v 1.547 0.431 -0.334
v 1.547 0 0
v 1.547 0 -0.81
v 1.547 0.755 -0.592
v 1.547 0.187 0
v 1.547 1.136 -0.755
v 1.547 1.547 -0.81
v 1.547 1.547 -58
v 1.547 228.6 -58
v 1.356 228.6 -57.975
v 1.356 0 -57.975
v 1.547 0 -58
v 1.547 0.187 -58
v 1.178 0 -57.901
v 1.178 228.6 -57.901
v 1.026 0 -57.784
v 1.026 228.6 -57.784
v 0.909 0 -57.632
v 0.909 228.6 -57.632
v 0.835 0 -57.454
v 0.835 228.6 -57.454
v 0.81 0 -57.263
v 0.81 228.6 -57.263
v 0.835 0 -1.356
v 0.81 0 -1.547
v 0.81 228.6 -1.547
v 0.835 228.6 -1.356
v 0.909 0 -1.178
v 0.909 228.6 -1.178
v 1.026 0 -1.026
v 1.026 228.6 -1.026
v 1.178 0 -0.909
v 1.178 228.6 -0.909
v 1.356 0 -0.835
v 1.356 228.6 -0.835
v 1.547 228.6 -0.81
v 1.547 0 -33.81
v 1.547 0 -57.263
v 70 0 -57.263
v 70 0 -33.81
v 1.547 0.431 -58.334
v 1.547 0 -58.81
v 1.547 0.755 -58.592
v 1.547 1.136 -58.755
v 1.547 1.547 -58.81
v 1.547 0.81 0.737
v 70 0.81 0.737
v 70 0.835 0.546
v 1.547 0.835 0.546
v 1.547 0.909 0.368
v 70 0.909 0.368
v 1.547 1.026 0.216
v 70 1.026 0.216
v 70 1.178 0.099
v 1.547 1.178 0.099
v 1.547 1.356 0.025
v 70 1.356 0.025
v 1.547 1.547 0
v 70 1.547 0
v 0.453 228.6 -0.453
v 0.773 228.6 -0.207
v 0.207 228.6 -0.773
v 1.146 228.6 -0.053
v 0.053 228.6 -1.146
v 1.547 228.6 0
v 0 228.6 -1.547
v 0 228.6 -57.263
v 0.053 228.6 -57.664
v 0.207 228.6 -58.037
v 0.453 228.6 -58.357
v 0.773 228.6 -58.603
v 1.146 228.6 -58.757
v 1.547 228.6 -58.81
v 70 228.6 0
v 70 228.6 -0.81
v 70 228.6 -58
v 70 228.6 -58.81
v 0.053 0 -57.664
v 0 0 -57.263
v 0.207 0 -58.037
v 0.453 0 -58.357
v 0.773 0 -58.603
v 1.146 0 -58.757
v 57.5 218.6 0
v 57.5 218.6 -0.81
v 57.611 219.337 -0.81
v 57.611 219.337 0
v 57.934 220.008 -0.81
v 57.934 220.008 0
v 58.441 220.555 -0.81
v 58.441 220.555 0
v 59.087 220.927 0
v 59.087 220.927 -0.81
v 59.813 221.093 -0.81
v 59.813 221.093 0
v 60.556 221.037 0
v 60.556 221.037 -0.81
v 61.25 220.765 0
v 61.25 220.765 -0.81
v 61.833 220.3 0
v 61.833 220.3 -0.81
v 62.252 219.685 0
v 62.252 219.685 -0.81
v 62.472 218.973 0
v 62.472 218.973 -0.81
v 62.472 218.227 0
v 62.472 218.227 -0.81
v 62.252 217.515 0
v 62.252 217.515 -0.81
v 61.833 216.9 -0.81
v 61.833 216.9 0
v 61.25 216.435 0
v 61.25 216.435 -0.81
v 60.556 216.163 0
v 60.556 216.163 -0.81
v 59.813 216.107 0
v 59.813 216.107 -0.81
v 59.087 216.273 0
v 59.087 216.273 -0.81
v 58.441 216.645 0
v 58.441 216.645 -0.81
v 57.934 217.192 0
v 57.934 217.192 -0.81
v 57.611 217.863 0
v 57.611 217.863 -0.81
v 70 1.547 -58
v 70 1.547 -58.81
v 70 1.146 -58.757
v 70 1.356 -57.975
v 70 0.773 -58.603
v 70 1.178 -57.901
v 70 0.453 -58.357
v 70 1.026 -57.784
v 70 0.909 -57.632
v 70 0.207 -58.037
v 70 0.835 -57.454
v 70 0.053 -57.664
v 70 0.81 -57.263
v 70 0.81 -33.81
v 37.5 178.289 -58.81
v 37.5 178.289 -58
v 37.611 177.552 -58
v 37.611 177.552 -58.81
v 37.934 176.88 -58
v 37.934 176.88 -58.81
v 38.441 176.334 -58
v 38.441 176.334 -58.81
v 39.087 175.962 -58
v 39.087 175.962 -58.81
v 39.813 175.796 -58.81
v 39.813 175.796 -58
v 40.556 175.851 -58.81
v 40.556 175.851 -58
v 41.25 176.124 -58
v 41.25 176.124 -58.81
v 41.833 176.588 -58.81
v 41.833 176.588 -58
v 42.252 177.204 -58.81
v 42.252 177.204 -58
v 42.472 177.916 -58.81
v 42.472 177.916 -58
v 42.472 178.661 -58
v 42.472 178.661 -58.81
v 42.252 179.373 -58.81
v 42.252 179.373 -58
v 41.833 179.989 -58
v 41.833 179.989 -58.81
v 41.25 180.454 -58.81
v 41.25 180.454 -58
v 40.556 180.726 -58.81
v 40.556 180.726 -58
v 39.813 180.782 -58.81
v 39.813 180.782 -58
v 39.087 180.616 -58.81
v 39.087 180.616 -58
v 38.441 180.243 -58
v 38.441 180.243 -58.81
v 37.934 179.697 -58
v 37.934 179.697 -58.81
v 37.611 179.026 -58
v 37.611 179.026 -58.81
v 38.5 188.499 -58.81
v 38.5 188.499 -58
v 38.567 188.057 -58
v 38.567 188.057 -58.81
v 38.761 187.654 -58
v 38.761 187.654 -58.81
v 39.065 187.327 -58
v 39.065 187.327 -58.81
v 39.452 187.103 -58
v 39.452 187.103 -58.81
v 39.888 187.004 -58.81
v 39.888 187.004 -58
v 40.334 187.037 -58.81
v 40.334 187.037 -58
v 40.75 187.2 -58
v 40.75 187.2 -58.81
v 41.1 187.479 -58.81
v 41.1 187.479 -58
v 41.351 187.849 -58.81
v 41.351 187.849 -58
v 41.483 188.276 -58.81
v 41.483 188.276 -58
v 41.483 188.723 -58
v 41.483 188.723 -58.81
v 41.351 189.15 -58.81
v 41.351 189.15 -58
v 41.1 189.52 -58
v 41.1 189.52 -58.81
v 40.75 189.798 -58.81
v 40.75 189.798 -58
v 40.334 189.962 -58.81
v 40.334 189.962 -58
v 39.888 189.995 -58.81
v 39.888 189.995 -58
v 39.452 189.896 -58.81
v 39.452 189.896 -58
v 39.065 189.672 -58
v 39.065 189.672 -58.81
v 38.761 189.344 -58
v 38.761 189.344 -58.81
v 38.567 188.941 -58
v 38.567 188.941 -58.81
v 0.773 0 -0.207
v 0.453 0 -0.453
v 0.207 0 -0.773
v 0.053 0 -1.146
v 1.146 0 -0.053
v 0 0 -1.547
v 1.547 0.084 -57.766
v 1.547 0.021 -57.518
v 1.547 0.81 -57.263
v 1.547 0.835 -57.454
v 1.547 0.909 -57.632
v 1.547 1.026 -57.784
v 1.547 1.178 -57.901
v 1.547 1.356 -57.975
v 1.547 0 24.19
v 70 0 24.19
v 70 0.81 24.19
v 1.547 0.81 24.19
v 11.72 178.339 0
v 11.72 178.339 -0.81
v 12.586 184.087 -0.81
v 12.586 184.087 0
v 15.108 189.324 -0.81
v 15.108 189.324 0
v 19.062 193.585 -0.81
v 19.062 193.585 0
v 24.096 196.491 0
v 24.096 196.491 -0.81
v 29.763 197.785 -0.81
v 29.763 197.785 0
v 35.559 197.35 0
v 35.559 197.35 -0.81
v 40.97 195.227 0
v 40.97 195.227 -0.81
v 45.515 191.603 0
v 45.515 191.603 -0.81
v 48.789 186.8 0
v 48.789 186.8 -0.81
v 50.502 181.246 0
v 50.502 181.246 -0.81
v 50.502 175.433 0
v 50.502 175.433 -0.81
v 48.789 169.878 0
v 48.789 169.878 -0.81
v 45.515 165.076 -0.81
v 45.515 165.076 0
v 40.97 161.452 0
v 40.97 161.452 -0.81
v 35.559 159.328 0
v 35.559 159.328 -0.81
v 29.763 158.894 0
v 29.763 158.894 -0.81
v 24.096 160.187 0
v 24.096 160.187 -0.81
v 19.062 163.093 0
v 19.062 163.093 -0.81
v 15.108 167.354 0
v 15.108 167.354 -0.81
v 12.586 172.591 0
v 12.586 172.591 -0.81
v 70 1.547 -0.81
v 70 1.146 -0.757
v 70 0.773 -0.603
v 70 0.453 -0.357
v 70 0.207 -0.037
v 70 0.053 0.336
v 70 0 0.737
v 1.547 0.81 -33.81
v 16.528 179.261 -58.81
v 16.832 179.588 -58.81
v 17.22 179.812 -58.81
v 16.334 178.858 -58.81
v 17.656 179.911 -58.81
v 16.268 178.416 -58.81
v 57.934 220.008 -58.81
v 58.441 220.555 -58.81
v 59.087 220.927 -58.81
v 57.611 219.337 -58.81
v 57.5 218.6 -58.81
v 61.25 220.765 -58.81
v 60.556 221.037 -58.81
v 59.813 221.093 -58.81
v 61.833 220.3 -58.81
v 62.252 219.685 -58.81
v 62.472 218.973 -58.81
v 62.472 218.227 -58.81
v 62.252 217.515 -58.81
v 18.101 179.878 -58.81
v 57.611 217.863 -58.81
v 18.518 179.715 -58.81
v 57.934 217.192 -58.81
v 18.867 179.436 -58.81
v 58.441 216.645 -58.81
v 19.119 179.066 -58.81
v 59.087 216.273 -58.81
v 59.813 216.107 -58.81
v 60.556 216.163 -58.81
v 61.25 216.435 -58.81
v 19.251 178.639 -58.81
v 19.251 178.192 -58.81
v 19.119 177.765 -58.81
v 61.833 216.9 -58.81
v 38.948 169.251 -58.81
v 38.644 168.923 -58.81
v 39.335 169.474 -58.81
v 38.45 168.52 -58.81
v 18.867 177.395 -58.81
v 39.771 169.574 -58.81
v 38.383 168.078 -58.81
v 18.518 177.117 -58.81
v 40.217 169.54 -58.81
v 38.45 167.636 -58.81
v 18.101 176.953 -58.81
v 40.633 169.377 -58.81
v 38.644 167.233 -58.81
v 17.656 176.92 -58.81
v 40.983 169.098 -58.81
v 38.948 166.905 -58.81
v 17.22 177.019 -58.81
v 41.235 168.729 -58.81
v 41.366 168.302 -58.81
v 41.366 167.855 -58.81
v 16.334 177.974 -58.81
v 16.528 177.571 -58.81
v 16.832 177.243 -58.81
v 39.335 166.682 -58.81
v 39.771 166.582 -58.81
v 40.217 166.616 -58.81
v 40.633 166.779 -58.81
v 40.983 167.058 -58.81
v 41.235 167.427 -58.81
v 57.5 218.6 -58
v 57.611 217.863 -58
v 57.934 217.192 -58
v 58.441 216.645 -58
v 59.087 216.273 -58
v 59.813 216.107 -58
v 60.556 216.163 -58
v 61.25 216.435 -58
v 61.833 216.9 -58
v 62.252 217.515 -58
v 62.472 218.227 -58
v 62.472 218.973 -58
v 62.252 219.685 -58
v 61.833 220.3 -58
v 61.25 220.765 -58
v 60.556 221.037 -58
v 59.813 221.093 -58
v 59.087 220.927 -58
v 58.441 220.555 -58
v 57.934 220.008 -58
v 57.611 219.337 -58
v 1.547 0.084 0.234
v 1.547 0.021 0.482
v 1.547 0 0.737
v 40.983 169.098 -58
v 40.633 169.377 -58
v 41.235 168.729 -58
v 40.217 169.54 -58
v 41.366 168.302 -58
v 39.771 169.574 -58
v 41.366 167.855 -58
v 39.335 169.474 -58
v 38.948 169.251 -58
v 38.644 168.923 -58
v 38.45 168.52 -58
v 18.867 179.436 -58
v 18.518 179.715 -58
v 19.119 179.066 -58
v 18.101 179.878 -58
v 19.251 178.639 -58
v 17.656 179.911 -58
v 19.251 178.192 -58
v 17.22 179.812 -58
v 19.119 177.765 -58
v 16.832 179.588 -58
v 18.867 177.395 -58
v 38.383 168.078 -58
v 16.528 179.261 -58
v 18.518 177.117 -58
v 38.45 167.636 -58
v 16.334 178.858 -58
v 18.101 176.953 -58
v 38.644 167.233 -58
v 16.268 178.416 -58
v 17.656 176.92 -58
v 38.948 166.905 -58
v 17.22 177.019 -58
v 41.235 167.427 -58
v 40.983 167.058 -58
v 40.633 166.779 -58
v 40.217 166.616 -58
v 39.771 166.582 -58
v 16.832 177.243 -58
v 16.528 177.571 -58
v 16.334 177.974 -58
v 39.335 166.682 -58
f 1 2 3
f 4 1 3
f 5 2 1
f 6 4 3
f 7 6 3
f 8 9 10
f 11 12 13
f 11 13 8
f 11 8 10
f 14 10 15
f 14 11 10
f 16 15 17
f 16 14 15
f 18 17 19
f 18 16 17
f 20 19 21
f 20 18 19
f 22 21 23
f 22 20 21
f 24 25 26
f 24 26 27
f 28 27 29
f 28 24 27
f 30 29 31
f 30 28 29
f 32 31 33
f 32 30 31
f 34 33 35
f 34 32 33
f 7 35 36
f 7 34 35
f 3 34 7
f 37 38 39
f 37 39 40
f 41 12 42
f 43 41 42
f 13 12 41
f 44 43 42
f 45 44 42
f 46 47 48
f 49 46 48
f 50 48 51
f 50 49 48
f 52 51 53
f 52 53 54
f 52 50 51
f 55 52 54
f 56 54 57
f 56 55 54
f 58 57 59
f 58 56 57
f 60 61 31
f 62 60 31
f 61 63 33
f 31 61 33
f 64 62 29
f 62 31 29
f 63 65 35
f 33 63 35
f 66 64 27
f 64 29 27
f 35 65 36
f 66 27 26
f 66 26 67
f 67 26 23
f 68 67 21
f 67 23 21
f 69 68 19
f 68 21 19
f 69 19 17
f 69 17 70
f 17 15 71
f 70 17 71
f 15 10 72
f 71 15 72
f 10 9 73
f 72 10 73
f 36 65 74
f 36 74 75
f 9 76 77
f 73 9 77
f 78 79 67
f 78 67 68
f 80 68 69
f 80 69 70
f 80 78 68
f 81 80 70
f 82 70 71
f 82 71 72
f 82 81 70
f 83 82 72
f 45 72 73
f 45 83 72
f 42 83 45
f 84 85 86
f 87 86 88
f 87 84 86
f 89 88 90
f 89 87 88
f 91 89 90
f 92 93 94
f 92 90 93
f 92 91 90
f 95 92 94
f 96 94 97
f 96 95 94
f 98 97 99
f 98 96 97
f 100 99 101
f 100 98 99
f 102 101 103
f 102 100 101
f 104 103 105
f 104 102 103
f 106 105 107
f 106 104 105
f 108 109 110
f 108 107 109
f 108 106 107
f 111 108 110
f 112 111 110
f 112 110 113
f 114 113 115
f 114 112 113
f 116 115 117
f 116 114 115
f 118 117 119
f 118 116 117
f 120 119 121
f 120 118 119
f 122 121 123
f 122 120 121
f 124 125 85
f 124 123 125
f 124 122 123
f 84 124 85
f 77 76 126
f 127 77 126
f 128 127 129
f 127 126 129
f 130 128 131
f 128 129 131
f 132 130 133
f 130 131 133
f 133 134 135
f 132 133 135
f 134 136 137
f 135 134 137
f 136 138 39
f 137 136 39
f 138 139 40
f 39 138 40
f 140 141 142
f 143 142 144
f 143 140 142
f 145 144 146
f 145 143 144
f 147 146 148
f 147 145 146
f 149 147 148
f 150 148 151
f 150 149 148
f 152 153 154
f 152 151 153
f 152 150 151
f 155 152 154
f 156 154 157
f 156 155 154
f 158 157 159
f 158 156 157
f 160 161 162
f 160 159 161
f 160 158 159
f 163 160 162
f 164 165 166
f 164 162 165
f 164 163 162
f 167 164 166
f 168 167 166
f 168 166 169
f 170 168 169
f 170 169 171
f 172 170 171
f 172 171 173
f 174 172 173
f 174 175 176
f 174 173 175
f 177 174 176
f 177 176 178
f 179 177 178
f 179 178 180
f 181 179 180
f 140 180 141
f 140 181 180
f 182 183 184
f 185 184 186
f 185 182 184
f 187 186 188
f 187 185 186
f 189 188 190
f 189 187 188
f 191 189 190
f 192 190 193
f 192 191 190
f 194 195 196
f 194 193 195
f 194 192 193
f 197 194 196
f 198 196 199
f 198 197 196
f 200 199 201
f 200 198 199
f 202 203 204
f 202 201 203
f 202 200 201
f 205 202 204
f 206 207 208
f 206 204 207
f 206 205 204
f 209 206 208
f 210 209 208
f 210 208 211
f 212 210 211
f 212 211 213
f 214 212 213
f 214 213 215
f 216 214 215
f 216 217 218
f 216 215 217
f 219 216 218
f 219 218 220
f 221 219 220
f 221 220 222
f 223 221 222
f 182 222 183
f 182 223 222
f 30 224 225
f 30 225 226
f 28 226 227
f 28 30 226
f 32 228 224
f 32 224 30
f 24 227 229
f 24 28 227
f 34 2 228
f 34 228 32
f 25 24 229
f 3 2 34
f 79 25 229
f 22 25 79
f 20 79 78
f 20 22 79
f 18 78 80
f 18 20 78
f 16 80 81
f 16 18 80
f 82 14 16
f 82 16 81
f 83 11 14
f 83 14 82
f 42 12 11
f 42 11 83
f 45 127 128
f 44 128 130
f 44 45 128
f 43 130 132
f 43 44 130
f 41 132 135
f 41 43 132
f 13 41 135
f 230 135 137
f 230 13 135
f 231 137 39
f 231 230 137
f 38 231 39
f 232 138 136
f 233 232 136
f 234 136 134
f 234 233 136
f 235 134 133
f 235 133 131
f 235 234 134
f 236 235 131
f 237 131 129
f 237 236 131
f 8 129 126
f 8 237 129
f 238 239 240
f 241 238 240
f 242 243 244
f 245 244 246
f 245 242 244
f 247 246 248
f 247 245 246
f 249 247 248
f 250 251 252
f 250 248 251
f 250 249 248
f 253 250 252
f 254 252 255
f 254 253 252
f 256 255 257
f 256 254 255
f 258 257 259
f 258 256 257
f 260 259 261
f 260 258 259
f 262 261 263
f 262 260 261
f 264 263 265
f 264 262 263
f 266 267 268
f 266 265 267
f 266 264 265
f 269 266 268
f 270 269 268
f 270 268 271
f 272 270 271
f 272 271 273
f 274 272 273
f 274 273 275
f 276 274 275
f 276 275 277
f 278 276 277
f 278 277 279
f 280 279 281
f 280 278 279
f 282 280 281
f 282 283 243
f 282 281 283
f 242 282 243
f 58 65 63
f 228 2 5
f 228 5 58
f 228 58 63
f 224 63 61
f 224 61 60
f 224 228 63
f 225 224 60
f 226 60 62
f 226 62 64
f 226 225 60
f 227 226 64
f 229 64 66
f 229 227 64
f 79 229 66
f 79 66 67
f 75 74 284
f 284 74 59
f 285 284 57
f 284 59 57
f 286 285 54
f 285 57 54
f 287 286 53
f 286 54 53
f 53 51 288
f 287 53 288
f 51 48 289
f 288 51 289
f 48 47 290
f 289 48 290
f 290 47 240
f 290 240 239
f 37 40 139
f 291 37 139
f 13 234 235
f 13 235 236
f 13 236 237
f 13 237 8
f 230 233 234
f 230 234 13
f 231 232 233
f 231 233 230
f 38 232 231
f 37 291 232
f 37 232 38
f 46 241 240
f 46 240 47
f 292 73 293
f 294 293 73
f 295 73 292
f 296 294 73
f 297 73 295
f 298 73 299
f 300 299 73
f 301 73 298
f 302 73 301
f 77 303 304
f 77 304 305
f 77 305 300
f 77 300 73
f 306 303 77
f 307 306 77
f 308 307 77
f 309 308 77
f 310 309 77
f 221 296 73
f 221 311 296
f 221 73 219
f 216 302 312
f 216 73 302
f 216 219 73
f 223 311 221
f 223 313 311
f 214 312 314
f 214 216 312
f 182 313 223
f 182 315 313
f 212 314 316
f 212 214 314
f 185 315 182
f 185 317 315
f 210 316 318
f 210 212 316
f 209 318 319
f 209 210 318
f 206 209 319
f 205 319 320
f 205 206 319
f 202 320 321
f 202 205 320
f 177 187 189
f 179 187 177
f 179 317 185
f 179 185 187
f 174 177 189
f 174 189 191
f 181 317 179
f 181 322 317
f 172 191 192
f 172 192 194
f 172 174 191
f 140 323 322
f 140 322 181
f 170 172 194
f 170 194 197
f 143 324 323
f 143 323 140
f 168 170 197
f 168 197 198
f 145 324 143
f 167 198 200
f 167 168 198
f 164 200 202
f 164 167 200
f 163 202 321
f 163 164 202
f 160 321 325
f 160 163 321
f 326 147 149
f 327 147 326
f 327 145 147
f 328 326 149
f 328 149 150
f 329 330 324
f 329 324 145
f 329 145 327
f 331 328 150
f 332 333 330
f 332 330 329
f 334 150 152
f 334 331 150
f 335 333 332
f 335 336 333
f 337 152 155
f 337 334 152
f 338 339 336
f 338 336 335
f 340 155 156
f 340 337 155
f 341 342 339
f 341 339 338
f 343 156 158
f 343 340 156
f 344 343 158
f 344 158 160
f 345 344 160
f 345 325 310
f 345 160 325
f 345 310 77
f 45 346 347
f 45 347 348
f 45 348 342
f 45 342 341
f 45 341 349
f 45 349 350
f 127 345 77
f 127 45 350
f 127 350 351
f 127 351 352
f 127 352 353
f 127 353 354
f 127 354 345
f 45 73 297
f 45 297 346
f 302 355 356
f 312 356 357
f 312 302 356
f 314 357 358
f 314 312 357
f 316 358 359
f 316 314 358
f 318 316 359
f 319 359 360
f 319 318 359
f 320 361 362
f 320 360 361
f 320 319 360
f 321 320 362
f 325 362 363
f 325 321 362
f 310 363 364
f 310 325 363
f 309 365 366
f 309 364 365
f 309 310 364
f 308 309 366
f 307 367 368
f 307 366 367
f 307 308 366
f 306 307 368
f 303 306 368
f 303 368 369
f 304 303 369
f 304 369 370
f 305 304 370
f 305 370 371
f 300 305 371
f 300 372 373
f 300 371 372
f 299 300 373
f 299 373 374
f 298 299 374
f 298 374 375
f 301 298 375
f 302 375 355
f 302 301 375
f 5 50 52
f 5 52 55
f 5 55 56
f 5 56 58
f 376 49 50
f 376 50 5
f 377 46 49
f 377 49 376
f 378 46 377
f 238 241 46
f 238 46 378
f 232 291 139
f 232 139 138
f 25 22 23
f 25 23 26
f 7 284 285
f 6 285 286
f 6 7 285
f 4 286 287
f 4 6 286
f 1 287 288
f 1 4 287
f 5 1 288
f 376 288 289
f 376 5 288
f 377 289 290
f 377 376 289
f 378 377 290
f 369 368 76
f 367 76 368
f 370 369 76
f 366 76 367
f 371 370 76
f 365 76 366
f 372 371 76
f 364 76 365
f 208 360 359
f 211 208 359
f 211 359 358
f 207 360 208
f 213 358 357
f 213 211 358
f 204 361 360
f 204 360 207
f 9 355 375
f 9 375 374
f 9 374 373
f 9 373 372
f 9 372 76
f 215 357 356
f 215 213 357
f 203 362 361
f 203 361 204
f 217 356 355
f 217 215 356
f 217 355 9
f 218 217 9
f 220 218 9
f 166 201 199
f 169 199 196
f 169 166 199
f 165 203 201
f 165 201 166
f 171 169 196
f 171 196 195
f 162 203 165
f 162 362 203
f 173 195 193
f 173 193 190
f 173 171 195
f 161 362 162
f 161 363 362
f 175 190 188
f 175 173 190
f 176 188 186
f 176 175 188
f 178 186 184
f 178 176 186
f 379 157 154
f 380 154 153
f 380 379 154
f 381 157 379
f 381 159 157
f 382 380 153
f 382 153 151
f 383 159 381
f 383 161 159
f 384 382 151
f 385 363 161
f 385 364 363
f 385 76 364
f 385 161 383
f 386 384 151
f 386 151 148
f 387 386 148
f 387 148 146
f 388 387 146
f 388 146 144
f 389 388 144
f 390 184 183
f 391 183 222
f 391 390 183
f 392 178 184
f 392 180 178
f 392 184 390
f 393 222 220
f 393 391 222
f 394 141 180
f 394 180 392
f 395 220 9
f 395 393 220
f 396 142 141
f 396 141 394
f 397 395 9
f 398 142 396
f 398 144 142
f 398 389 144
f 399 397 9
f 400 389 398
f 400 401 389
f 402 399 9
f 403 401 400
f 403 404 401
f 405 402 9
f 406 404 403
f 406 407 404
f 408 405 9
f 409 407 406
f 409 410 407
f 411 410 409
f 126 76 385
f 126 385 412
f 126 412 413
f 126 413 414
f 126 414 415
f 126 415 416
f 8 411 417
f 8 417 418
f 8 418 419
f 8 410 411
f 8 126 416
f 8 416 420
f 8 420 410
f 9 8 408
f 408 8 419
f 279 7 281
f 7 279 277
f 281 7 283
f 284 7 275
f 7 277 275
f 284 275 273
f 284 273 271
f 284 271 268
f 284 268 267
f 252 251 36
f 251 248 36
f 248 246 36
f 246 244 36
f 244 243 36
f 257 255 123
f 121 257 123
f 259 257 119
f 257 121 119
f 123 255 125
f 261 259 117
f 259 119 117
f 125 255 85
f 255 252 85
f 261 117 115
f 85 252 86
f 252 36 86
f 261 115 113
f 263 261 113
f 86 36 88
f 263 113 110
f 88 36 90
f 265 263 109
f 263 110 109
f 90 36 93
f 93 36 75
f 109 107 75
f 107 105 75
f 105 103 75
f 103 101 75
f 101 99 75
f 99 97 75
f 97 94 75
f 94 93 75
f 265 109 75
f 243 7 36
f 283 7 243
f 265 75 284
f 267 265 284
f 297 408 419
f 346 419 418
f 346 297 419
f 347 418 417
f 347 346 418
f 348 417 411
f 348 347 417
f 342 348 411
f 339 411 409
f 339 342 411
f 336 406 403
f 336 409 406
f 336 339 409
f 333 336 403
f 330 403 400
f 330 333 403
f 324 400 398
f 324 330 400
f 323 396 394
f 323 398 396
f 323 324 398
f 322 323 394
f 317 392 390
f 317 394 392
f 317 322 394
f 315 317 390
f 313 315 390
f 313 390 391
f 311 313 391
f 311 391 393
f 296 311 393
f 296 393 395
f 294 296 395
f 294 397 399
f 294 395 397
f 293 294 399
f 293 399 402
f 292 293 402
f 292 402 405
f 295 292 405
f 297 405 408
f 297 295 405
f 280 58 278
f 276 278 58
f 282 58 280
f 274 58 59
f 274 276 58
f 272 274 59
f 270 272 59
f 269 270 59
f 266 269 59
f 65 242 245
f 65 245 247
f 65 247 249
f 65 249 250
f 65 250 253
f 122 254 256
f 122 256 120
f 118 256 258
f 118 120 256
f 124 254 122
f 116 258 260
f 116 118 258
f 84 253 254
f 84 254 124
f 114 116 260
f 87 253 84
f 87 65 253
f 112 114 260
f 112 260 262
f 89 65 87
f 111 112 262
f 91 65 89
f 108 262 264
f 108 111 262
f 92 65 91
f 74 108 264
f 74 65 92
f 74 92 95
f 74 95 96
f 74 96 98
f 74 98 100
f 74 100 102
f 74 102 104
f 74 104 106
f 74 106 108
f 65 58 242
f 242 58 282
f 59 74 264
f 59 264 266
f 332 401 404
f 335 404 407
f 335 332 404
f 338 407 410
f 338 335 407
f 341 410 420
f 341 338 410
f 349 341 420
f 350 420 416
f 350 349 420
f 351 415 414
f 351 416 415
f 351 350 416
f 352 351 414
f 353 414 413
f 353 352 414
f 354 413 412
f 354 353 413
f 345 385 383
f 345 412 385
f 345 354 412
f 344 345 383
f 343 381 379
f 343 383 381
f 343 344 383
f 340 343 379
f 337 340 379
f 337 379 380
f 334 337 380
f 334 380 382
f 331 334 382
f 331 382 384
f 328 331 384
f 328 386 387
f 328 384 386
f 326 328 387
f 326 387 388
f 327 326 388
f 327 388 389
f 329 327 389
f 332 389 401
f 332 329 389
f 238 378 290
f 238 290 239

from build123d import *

# Parameters (mm, degrees)
SKETCH1_W                      = 70
SKETCH1_H                      = 228.6
BASE_FLANGE1_DEPTH             = 0.81
EDGE_FLANGE1_STRIP_W           = 4.7132
EDGE_FLANGE1_STRIP_H           = 0.81
EDGE_FLANGE1_STRIP_CUT_DEPTH   = 228.6
EDGE_FLANGE1_DEPTH             = 228.6
EDGE_FLANGE2_STRIP_W           = 4.7132
EDGE_FLANGE2_STRIP_H           = 0.81
EDGE_FLANGE2_STRIP_CUT_DEPTH   = 228.6
EDGE_FLANGE2_DEPTH             = 228.6
EDGE_FLANGE3_STRIP_W           = 4.7132
EDGE_FLANGE3_STRIP_H           = 0.81
EDGE_FLANGE3_STRIP_CUT_DEPTH   = 68.4534
EDGE_FLANGE3_STRIP_2_W         = 4.7132
EDGE_FLANGE3_STRIP_2_H         = 0.81
EDGE_FLANGE3_STRIP_CUT_2_DEPTH = 68.4534
EDGE_FLANGE3_DEPTH             = 68.4534
EDGE_FLANGE3_BEND_DEPTH        = 68.4534
CUT_EXTRUDE2_REACH             = 255.075
SKETCH18_R                     = 2.5
SKETCH18_R_2                   = 1.5
CUT_EXTRUDE1_REACH             = 248.204
SKETCH17_R                     = 19.5
SKETCH17_R_2                   = 2.5


# Sheet-metal steps are written as plain solids
with BuildPart() as part:
    # Sketch1 → Base-Flange1 (new body)
    with BuildSketch(Plane.XY):
        with Locations((35, 114.3)):
            Rectangle(SKETCH1_W, SKETCH1_H)
    extrude(amount=-BASE_FLANGE1_DEPTH)

    # Edge-Flange1 strip (across the edge) → Edge-Flange1 strip cut (cut)
    with BuildSketch(Plane(origin=(0, 0, -0.81), x_dir=(1, 0, 0), z_dir=(0, 1, 0))):
        with Locations((-0.81, -0.405)):
            Rectangle(EDGE_FLANGE1_STRIP_W, EDGE_FLANGE1_STRIP_H)
    extrude(amount=EDGE_FLANGE1_STRIP_CUT_DEPTH, mode=Mode.SUBTRACT)

    # Edge-Flange1 section (across the edge) → Edge-Flange1 (add)
    with BuildSketch(Plane(origin=(0, 0, -0.81), x_dir=(1, 0, 0), z_dir=(0, 1, 0))):
        with BuildLine():
            Line((0, 0.7366), (0, 58))
            Line((0, 58), (0.81, 58))
            Line((0.81, 58), (0.81, 0.7366))
            ThreePointArc((0.81, 0.7366), (1.025745145, 0.215745145), (1.5466, 0))
            Line((1.5466, 0), (1.5466, -0.81))
            ThreePointArc((1.5466, -0.81), (0.452988652, -0.357011348), (0, 0.7366))
        make_face()
    extrude(amount=EDGE_FLANGE1_DEPTH)

    # Edge-Flange2 strip (across the edge) → Edge-Flange2 strip cut (cut)
    with BuildSketch(Plane(origin=(0.81, 0, -58.81), x_dir=(0, 0, 1), z_dir=(0, 1, 0))):
        with Locations((-0.81, -0.405)):
            Rectangle(EDGE_FLANGE2_STRIP_W, EDGE_FLANGE2_STRIP_H)
    extrude(amount=EDGE_FLANGE2_STRIP_CUT_DEPTH, mode=Mode.SUBTRACT)

    # Edge-Flange2 section (across the edge) → Edge-Flange2 (add)
    with BuildSketch(Plane(origin=(0.81, 0, -58.81), x_dir=(0, 0, 1), z_dir=(0, 1, 0))):
        with BuildLine():
            Line((0, 0.7366), (0, 69.19))
            Line((0, 69.19), (0.81, 69.19))
            Line((0.81, 69.19), (0.81, 0.7366))
            ThreePointArc((0.81, 0.7366), (1.025745145, 0.215745145), (1.5466, 0))
            Line((1.5466, 0), (1.5466, -0.81))
            ThreePointArc((1.5466, -0.81), (0.452988652, -0.357011348), (0, 0.7366))
        make_face()
    extrude(amount=EDGE_FLANGE2_DEPTH)

    # Edge-Flange3 strip (across the edge) → Edge-Flange3 strip cut (cut)
    with BuildSketch(Plane.YZ.offset(1.5466)):
        with Locations((-0.81, -0.405)):
            Rectangle(EDGE_FLANGE3_STRIP_W, EDGE_FLANGE3_STRIP_H)
    extrude(amount=EDGE_FLANGE3_STRIP_CUT_DEPTH, mode=Mode.SUBTRACT)

    # Edge-Flange3 strip 2 (across the edge) → Edge-Flange3 strip cut 2 (cut)
    with BuildSketch(Plane(origin=(1.5466, 0, -58), x_dir=(0, 1, 0), z_dir=(1, 0, 0))):
        with Locations((-0.81, -0.405)):
            Rectangle(EDGE_FLANGE3_STRIP_2_W, EDGE_FLANGE3_STRIP_2_H)
    extrude(amount=EDGE_FLANGE3_STRIP_CUT_2_DEPTH, mode=Mode.SUBTRACT)

    # Edge-Flange3 section (across the edge) → Edge-Flange3 (add)
    with BuildSketch(Plane.YZ.offset(1.5466)):
        with BuildLine():
            Line((0, 0.7366), (0, 24.19))
            Line((0, 24.19), (0.81, 24.19))
            Line((0.81, 24.19), (0.81, 0.7366))
            ThreePointArc((0.81, 0.7366), (1.025745145, 0.215745145), (1.5466, 0))
            Line((1.5466, 0), (1.5466, -0.81))
            ThreePointArc((1.5466, -0.81), (0.452988652, -0.357011348), (0, 0.7366))
        make_face()
    extrude(amount=EDGE_FLANGE3_DEPTH)

    # Edge-Flange3 section 2 (across the edge) → Edge-Flange3 bend (add)
    with BuildSketch(Plane(origin=(1.5466, 0, -58), x_dir=(0, 1, 0), z_dir=(1, 0, 0))):
        with BuildLine():
            Line((0, 0.7366), (0, 24.19))
            Line((0, 24.19), (0.81, 24.19))
            Line((0.81, 24.19), (0.81, 0.7366))
            ThreePointArc((0.81, 0.7366), (1.025745145, 0.215745145), (1.5466, 0))
            Line((1.5466, 0), (1.5466, -0.81))
            ThreePointArc((1.5466, -0.81), (0.452988652, -0.357011348), (0, 0.7366))
        make_face()
    extrude(amount=EDGE_FLANGE3_BEND_DEPTH)

    # Sketch18 → Cut-Extrude2 (cut, up to next)
    with BuildSketch(Plane.XY.offset(-58.81), mode=Mode.PRIVATE) as cut_extrude2_sk1:
        with Locations(Location((40, 178.288711259, 0), (0, 0, 180))):
            Circle(SKETCH18_R)
    cut_extrude2_tool1 = extrude(cut_extrude2_sk1.sketch, amount=CUT_EXTRUDE2_REACH, mode=Mode.PRIVATE) & part.part
    # Sketch18 → Cut-Extrude2 (cut, up to next)
    with BuildSketch(Plane.XY.offset(-58.81), mode=Mode.PRIVATE) as cut_extrude2_sk2:
        with Locations(Location((60, 218.6, 0), (0, 0, 180))):
            Circle(SKETCH18_R)
    cut_extrude2_tool2 = extrude(cut_extrude2_sk2.sketch, amount=CUT_EXTRUDE2_REACH, mode=Mode.PRIVATE) & part.part
    # Sketch18 → Cut-Extrude2 (cut, up to next)
    with BuildSketch(Plane.XY.offset(-58.81), mode=Mode.PRIVATE) as cut_extrude2_sk3:
        with Locations(Location((39.883110044, 168.078078525, 0), (0, 0, 180))):
            Circle(SKETCH18_R_2)
    cut_extrude2_tool3 = extrude(cut_extrude2_sk3.sketch, amount=CUT_EXTRUDE2_REACH, mode=Mode.PRIVATE) & part.part
    # Sketch18 → Cut-Extrude2 (cut, up to next)
    with BuildSketch(Plane.XY.offset(-58.81), mode=Mode.PRIVATE) as cut_extrude2_sk4:
        with Locations(Location((40, 188.499343992, 0), (0, 0, 180))):
            Circle(SKETCH18_R_2)
    cut_extrude2_tool4 = extrude(cut_extrude2_sk4.sketch, amount=CUT_EXTRUDE2_REACH, mode=Mode.PRIVATE) & part.part
    # Sketch18 → Cut-Extrude2 (cut, up to next)
    with BuildSketch(Plane.XY.offset(-58.81), mode=Mode.PRIVATE) as cut_extrude2_sk5:
        with Locations(Location((17.767718264, 178.415632815, 0), (0, 0, 180))):
            Circle(SKETCH18_R_2)
    cut_extrude2_tool5 = extrude(cut_extrude2_sk5.sketch, amount=CUT_EXTRUDE2_REACH, mode=Mode.PRIVATE) & part.part
    add(cut_extrude2_tool1.solids().sort_by_distance((40, 178.288711, -58.81))[0], mode=Mode.SUBTRACT)
    add(cut_extrude2_tool2.solids().sort_by_distance((60, 218.6, -58.81))[0], mode=Mode.SUBTRACT)
    add(cut_extrude2_tool3.solids().sort_by_distance((39.88311, 168.078079, -58.81))[0], mode=Mode.SUBTRACT)
    add(cut_extrude2_tool4.solids().sort_by_distance((40, 188.499344, -58.81))[0], mode=Mode.SUBTRACT)
    add(cut_extrude2_tool5.solids().sort_by_distance((17.767718, 178.415633, -58.81))[0], mode=Mode.SUBTRACT)

    # Sketch17 → Cut-Extrude1 (cut, up to next)
    with BuildSketch(Plane(origin=(0, 0, 0), x_dir=(-1, 0, 0), z_dir=(0, 0, -1)), mode=Mode.PRIVATE) as cut_extrude1_sk1:
        with Locations((-31.22013265, 178.33917696)):
            Circle(SKETCH17_R)
    cut_extrude1_tool1 = extrude(cut_extrude1_sk1.sketch, amount=CUT_EXTRUDE1_REACH, mode=Mode.PRIVATE) & part.part
    # Sketch17 → Cut-Extrude1 (cut, up to next)
    with BuildSketch(Plane(origin=(0, 0, 0), x_dir=(-1, 0, 0), z_dir=(0, 0, -1)), mode=Mode.PRIVATE) as cut_extrude1_sk2:
        with Locations((-60, 218.6)):
            Circle(SKETCH17_R_2)
    cut_extrude1_tool2 = extrude(cut_extrude1_sk2.sketch, amount=CUT_EXTRUDE1_REACH, mode=Mode.PRIVATE) & part.part
    add(cut_extrude1_tool1.solids().sort_by_distance((31.220133, 178.339177, 0))[0], mode=Mode.SUBTRACT)
    add(cut_extrude1_tool2.solids().sort_by_distance((60, 218.6, 0))[0], mode=Mode.SUBTRACT)


solid = part.part
